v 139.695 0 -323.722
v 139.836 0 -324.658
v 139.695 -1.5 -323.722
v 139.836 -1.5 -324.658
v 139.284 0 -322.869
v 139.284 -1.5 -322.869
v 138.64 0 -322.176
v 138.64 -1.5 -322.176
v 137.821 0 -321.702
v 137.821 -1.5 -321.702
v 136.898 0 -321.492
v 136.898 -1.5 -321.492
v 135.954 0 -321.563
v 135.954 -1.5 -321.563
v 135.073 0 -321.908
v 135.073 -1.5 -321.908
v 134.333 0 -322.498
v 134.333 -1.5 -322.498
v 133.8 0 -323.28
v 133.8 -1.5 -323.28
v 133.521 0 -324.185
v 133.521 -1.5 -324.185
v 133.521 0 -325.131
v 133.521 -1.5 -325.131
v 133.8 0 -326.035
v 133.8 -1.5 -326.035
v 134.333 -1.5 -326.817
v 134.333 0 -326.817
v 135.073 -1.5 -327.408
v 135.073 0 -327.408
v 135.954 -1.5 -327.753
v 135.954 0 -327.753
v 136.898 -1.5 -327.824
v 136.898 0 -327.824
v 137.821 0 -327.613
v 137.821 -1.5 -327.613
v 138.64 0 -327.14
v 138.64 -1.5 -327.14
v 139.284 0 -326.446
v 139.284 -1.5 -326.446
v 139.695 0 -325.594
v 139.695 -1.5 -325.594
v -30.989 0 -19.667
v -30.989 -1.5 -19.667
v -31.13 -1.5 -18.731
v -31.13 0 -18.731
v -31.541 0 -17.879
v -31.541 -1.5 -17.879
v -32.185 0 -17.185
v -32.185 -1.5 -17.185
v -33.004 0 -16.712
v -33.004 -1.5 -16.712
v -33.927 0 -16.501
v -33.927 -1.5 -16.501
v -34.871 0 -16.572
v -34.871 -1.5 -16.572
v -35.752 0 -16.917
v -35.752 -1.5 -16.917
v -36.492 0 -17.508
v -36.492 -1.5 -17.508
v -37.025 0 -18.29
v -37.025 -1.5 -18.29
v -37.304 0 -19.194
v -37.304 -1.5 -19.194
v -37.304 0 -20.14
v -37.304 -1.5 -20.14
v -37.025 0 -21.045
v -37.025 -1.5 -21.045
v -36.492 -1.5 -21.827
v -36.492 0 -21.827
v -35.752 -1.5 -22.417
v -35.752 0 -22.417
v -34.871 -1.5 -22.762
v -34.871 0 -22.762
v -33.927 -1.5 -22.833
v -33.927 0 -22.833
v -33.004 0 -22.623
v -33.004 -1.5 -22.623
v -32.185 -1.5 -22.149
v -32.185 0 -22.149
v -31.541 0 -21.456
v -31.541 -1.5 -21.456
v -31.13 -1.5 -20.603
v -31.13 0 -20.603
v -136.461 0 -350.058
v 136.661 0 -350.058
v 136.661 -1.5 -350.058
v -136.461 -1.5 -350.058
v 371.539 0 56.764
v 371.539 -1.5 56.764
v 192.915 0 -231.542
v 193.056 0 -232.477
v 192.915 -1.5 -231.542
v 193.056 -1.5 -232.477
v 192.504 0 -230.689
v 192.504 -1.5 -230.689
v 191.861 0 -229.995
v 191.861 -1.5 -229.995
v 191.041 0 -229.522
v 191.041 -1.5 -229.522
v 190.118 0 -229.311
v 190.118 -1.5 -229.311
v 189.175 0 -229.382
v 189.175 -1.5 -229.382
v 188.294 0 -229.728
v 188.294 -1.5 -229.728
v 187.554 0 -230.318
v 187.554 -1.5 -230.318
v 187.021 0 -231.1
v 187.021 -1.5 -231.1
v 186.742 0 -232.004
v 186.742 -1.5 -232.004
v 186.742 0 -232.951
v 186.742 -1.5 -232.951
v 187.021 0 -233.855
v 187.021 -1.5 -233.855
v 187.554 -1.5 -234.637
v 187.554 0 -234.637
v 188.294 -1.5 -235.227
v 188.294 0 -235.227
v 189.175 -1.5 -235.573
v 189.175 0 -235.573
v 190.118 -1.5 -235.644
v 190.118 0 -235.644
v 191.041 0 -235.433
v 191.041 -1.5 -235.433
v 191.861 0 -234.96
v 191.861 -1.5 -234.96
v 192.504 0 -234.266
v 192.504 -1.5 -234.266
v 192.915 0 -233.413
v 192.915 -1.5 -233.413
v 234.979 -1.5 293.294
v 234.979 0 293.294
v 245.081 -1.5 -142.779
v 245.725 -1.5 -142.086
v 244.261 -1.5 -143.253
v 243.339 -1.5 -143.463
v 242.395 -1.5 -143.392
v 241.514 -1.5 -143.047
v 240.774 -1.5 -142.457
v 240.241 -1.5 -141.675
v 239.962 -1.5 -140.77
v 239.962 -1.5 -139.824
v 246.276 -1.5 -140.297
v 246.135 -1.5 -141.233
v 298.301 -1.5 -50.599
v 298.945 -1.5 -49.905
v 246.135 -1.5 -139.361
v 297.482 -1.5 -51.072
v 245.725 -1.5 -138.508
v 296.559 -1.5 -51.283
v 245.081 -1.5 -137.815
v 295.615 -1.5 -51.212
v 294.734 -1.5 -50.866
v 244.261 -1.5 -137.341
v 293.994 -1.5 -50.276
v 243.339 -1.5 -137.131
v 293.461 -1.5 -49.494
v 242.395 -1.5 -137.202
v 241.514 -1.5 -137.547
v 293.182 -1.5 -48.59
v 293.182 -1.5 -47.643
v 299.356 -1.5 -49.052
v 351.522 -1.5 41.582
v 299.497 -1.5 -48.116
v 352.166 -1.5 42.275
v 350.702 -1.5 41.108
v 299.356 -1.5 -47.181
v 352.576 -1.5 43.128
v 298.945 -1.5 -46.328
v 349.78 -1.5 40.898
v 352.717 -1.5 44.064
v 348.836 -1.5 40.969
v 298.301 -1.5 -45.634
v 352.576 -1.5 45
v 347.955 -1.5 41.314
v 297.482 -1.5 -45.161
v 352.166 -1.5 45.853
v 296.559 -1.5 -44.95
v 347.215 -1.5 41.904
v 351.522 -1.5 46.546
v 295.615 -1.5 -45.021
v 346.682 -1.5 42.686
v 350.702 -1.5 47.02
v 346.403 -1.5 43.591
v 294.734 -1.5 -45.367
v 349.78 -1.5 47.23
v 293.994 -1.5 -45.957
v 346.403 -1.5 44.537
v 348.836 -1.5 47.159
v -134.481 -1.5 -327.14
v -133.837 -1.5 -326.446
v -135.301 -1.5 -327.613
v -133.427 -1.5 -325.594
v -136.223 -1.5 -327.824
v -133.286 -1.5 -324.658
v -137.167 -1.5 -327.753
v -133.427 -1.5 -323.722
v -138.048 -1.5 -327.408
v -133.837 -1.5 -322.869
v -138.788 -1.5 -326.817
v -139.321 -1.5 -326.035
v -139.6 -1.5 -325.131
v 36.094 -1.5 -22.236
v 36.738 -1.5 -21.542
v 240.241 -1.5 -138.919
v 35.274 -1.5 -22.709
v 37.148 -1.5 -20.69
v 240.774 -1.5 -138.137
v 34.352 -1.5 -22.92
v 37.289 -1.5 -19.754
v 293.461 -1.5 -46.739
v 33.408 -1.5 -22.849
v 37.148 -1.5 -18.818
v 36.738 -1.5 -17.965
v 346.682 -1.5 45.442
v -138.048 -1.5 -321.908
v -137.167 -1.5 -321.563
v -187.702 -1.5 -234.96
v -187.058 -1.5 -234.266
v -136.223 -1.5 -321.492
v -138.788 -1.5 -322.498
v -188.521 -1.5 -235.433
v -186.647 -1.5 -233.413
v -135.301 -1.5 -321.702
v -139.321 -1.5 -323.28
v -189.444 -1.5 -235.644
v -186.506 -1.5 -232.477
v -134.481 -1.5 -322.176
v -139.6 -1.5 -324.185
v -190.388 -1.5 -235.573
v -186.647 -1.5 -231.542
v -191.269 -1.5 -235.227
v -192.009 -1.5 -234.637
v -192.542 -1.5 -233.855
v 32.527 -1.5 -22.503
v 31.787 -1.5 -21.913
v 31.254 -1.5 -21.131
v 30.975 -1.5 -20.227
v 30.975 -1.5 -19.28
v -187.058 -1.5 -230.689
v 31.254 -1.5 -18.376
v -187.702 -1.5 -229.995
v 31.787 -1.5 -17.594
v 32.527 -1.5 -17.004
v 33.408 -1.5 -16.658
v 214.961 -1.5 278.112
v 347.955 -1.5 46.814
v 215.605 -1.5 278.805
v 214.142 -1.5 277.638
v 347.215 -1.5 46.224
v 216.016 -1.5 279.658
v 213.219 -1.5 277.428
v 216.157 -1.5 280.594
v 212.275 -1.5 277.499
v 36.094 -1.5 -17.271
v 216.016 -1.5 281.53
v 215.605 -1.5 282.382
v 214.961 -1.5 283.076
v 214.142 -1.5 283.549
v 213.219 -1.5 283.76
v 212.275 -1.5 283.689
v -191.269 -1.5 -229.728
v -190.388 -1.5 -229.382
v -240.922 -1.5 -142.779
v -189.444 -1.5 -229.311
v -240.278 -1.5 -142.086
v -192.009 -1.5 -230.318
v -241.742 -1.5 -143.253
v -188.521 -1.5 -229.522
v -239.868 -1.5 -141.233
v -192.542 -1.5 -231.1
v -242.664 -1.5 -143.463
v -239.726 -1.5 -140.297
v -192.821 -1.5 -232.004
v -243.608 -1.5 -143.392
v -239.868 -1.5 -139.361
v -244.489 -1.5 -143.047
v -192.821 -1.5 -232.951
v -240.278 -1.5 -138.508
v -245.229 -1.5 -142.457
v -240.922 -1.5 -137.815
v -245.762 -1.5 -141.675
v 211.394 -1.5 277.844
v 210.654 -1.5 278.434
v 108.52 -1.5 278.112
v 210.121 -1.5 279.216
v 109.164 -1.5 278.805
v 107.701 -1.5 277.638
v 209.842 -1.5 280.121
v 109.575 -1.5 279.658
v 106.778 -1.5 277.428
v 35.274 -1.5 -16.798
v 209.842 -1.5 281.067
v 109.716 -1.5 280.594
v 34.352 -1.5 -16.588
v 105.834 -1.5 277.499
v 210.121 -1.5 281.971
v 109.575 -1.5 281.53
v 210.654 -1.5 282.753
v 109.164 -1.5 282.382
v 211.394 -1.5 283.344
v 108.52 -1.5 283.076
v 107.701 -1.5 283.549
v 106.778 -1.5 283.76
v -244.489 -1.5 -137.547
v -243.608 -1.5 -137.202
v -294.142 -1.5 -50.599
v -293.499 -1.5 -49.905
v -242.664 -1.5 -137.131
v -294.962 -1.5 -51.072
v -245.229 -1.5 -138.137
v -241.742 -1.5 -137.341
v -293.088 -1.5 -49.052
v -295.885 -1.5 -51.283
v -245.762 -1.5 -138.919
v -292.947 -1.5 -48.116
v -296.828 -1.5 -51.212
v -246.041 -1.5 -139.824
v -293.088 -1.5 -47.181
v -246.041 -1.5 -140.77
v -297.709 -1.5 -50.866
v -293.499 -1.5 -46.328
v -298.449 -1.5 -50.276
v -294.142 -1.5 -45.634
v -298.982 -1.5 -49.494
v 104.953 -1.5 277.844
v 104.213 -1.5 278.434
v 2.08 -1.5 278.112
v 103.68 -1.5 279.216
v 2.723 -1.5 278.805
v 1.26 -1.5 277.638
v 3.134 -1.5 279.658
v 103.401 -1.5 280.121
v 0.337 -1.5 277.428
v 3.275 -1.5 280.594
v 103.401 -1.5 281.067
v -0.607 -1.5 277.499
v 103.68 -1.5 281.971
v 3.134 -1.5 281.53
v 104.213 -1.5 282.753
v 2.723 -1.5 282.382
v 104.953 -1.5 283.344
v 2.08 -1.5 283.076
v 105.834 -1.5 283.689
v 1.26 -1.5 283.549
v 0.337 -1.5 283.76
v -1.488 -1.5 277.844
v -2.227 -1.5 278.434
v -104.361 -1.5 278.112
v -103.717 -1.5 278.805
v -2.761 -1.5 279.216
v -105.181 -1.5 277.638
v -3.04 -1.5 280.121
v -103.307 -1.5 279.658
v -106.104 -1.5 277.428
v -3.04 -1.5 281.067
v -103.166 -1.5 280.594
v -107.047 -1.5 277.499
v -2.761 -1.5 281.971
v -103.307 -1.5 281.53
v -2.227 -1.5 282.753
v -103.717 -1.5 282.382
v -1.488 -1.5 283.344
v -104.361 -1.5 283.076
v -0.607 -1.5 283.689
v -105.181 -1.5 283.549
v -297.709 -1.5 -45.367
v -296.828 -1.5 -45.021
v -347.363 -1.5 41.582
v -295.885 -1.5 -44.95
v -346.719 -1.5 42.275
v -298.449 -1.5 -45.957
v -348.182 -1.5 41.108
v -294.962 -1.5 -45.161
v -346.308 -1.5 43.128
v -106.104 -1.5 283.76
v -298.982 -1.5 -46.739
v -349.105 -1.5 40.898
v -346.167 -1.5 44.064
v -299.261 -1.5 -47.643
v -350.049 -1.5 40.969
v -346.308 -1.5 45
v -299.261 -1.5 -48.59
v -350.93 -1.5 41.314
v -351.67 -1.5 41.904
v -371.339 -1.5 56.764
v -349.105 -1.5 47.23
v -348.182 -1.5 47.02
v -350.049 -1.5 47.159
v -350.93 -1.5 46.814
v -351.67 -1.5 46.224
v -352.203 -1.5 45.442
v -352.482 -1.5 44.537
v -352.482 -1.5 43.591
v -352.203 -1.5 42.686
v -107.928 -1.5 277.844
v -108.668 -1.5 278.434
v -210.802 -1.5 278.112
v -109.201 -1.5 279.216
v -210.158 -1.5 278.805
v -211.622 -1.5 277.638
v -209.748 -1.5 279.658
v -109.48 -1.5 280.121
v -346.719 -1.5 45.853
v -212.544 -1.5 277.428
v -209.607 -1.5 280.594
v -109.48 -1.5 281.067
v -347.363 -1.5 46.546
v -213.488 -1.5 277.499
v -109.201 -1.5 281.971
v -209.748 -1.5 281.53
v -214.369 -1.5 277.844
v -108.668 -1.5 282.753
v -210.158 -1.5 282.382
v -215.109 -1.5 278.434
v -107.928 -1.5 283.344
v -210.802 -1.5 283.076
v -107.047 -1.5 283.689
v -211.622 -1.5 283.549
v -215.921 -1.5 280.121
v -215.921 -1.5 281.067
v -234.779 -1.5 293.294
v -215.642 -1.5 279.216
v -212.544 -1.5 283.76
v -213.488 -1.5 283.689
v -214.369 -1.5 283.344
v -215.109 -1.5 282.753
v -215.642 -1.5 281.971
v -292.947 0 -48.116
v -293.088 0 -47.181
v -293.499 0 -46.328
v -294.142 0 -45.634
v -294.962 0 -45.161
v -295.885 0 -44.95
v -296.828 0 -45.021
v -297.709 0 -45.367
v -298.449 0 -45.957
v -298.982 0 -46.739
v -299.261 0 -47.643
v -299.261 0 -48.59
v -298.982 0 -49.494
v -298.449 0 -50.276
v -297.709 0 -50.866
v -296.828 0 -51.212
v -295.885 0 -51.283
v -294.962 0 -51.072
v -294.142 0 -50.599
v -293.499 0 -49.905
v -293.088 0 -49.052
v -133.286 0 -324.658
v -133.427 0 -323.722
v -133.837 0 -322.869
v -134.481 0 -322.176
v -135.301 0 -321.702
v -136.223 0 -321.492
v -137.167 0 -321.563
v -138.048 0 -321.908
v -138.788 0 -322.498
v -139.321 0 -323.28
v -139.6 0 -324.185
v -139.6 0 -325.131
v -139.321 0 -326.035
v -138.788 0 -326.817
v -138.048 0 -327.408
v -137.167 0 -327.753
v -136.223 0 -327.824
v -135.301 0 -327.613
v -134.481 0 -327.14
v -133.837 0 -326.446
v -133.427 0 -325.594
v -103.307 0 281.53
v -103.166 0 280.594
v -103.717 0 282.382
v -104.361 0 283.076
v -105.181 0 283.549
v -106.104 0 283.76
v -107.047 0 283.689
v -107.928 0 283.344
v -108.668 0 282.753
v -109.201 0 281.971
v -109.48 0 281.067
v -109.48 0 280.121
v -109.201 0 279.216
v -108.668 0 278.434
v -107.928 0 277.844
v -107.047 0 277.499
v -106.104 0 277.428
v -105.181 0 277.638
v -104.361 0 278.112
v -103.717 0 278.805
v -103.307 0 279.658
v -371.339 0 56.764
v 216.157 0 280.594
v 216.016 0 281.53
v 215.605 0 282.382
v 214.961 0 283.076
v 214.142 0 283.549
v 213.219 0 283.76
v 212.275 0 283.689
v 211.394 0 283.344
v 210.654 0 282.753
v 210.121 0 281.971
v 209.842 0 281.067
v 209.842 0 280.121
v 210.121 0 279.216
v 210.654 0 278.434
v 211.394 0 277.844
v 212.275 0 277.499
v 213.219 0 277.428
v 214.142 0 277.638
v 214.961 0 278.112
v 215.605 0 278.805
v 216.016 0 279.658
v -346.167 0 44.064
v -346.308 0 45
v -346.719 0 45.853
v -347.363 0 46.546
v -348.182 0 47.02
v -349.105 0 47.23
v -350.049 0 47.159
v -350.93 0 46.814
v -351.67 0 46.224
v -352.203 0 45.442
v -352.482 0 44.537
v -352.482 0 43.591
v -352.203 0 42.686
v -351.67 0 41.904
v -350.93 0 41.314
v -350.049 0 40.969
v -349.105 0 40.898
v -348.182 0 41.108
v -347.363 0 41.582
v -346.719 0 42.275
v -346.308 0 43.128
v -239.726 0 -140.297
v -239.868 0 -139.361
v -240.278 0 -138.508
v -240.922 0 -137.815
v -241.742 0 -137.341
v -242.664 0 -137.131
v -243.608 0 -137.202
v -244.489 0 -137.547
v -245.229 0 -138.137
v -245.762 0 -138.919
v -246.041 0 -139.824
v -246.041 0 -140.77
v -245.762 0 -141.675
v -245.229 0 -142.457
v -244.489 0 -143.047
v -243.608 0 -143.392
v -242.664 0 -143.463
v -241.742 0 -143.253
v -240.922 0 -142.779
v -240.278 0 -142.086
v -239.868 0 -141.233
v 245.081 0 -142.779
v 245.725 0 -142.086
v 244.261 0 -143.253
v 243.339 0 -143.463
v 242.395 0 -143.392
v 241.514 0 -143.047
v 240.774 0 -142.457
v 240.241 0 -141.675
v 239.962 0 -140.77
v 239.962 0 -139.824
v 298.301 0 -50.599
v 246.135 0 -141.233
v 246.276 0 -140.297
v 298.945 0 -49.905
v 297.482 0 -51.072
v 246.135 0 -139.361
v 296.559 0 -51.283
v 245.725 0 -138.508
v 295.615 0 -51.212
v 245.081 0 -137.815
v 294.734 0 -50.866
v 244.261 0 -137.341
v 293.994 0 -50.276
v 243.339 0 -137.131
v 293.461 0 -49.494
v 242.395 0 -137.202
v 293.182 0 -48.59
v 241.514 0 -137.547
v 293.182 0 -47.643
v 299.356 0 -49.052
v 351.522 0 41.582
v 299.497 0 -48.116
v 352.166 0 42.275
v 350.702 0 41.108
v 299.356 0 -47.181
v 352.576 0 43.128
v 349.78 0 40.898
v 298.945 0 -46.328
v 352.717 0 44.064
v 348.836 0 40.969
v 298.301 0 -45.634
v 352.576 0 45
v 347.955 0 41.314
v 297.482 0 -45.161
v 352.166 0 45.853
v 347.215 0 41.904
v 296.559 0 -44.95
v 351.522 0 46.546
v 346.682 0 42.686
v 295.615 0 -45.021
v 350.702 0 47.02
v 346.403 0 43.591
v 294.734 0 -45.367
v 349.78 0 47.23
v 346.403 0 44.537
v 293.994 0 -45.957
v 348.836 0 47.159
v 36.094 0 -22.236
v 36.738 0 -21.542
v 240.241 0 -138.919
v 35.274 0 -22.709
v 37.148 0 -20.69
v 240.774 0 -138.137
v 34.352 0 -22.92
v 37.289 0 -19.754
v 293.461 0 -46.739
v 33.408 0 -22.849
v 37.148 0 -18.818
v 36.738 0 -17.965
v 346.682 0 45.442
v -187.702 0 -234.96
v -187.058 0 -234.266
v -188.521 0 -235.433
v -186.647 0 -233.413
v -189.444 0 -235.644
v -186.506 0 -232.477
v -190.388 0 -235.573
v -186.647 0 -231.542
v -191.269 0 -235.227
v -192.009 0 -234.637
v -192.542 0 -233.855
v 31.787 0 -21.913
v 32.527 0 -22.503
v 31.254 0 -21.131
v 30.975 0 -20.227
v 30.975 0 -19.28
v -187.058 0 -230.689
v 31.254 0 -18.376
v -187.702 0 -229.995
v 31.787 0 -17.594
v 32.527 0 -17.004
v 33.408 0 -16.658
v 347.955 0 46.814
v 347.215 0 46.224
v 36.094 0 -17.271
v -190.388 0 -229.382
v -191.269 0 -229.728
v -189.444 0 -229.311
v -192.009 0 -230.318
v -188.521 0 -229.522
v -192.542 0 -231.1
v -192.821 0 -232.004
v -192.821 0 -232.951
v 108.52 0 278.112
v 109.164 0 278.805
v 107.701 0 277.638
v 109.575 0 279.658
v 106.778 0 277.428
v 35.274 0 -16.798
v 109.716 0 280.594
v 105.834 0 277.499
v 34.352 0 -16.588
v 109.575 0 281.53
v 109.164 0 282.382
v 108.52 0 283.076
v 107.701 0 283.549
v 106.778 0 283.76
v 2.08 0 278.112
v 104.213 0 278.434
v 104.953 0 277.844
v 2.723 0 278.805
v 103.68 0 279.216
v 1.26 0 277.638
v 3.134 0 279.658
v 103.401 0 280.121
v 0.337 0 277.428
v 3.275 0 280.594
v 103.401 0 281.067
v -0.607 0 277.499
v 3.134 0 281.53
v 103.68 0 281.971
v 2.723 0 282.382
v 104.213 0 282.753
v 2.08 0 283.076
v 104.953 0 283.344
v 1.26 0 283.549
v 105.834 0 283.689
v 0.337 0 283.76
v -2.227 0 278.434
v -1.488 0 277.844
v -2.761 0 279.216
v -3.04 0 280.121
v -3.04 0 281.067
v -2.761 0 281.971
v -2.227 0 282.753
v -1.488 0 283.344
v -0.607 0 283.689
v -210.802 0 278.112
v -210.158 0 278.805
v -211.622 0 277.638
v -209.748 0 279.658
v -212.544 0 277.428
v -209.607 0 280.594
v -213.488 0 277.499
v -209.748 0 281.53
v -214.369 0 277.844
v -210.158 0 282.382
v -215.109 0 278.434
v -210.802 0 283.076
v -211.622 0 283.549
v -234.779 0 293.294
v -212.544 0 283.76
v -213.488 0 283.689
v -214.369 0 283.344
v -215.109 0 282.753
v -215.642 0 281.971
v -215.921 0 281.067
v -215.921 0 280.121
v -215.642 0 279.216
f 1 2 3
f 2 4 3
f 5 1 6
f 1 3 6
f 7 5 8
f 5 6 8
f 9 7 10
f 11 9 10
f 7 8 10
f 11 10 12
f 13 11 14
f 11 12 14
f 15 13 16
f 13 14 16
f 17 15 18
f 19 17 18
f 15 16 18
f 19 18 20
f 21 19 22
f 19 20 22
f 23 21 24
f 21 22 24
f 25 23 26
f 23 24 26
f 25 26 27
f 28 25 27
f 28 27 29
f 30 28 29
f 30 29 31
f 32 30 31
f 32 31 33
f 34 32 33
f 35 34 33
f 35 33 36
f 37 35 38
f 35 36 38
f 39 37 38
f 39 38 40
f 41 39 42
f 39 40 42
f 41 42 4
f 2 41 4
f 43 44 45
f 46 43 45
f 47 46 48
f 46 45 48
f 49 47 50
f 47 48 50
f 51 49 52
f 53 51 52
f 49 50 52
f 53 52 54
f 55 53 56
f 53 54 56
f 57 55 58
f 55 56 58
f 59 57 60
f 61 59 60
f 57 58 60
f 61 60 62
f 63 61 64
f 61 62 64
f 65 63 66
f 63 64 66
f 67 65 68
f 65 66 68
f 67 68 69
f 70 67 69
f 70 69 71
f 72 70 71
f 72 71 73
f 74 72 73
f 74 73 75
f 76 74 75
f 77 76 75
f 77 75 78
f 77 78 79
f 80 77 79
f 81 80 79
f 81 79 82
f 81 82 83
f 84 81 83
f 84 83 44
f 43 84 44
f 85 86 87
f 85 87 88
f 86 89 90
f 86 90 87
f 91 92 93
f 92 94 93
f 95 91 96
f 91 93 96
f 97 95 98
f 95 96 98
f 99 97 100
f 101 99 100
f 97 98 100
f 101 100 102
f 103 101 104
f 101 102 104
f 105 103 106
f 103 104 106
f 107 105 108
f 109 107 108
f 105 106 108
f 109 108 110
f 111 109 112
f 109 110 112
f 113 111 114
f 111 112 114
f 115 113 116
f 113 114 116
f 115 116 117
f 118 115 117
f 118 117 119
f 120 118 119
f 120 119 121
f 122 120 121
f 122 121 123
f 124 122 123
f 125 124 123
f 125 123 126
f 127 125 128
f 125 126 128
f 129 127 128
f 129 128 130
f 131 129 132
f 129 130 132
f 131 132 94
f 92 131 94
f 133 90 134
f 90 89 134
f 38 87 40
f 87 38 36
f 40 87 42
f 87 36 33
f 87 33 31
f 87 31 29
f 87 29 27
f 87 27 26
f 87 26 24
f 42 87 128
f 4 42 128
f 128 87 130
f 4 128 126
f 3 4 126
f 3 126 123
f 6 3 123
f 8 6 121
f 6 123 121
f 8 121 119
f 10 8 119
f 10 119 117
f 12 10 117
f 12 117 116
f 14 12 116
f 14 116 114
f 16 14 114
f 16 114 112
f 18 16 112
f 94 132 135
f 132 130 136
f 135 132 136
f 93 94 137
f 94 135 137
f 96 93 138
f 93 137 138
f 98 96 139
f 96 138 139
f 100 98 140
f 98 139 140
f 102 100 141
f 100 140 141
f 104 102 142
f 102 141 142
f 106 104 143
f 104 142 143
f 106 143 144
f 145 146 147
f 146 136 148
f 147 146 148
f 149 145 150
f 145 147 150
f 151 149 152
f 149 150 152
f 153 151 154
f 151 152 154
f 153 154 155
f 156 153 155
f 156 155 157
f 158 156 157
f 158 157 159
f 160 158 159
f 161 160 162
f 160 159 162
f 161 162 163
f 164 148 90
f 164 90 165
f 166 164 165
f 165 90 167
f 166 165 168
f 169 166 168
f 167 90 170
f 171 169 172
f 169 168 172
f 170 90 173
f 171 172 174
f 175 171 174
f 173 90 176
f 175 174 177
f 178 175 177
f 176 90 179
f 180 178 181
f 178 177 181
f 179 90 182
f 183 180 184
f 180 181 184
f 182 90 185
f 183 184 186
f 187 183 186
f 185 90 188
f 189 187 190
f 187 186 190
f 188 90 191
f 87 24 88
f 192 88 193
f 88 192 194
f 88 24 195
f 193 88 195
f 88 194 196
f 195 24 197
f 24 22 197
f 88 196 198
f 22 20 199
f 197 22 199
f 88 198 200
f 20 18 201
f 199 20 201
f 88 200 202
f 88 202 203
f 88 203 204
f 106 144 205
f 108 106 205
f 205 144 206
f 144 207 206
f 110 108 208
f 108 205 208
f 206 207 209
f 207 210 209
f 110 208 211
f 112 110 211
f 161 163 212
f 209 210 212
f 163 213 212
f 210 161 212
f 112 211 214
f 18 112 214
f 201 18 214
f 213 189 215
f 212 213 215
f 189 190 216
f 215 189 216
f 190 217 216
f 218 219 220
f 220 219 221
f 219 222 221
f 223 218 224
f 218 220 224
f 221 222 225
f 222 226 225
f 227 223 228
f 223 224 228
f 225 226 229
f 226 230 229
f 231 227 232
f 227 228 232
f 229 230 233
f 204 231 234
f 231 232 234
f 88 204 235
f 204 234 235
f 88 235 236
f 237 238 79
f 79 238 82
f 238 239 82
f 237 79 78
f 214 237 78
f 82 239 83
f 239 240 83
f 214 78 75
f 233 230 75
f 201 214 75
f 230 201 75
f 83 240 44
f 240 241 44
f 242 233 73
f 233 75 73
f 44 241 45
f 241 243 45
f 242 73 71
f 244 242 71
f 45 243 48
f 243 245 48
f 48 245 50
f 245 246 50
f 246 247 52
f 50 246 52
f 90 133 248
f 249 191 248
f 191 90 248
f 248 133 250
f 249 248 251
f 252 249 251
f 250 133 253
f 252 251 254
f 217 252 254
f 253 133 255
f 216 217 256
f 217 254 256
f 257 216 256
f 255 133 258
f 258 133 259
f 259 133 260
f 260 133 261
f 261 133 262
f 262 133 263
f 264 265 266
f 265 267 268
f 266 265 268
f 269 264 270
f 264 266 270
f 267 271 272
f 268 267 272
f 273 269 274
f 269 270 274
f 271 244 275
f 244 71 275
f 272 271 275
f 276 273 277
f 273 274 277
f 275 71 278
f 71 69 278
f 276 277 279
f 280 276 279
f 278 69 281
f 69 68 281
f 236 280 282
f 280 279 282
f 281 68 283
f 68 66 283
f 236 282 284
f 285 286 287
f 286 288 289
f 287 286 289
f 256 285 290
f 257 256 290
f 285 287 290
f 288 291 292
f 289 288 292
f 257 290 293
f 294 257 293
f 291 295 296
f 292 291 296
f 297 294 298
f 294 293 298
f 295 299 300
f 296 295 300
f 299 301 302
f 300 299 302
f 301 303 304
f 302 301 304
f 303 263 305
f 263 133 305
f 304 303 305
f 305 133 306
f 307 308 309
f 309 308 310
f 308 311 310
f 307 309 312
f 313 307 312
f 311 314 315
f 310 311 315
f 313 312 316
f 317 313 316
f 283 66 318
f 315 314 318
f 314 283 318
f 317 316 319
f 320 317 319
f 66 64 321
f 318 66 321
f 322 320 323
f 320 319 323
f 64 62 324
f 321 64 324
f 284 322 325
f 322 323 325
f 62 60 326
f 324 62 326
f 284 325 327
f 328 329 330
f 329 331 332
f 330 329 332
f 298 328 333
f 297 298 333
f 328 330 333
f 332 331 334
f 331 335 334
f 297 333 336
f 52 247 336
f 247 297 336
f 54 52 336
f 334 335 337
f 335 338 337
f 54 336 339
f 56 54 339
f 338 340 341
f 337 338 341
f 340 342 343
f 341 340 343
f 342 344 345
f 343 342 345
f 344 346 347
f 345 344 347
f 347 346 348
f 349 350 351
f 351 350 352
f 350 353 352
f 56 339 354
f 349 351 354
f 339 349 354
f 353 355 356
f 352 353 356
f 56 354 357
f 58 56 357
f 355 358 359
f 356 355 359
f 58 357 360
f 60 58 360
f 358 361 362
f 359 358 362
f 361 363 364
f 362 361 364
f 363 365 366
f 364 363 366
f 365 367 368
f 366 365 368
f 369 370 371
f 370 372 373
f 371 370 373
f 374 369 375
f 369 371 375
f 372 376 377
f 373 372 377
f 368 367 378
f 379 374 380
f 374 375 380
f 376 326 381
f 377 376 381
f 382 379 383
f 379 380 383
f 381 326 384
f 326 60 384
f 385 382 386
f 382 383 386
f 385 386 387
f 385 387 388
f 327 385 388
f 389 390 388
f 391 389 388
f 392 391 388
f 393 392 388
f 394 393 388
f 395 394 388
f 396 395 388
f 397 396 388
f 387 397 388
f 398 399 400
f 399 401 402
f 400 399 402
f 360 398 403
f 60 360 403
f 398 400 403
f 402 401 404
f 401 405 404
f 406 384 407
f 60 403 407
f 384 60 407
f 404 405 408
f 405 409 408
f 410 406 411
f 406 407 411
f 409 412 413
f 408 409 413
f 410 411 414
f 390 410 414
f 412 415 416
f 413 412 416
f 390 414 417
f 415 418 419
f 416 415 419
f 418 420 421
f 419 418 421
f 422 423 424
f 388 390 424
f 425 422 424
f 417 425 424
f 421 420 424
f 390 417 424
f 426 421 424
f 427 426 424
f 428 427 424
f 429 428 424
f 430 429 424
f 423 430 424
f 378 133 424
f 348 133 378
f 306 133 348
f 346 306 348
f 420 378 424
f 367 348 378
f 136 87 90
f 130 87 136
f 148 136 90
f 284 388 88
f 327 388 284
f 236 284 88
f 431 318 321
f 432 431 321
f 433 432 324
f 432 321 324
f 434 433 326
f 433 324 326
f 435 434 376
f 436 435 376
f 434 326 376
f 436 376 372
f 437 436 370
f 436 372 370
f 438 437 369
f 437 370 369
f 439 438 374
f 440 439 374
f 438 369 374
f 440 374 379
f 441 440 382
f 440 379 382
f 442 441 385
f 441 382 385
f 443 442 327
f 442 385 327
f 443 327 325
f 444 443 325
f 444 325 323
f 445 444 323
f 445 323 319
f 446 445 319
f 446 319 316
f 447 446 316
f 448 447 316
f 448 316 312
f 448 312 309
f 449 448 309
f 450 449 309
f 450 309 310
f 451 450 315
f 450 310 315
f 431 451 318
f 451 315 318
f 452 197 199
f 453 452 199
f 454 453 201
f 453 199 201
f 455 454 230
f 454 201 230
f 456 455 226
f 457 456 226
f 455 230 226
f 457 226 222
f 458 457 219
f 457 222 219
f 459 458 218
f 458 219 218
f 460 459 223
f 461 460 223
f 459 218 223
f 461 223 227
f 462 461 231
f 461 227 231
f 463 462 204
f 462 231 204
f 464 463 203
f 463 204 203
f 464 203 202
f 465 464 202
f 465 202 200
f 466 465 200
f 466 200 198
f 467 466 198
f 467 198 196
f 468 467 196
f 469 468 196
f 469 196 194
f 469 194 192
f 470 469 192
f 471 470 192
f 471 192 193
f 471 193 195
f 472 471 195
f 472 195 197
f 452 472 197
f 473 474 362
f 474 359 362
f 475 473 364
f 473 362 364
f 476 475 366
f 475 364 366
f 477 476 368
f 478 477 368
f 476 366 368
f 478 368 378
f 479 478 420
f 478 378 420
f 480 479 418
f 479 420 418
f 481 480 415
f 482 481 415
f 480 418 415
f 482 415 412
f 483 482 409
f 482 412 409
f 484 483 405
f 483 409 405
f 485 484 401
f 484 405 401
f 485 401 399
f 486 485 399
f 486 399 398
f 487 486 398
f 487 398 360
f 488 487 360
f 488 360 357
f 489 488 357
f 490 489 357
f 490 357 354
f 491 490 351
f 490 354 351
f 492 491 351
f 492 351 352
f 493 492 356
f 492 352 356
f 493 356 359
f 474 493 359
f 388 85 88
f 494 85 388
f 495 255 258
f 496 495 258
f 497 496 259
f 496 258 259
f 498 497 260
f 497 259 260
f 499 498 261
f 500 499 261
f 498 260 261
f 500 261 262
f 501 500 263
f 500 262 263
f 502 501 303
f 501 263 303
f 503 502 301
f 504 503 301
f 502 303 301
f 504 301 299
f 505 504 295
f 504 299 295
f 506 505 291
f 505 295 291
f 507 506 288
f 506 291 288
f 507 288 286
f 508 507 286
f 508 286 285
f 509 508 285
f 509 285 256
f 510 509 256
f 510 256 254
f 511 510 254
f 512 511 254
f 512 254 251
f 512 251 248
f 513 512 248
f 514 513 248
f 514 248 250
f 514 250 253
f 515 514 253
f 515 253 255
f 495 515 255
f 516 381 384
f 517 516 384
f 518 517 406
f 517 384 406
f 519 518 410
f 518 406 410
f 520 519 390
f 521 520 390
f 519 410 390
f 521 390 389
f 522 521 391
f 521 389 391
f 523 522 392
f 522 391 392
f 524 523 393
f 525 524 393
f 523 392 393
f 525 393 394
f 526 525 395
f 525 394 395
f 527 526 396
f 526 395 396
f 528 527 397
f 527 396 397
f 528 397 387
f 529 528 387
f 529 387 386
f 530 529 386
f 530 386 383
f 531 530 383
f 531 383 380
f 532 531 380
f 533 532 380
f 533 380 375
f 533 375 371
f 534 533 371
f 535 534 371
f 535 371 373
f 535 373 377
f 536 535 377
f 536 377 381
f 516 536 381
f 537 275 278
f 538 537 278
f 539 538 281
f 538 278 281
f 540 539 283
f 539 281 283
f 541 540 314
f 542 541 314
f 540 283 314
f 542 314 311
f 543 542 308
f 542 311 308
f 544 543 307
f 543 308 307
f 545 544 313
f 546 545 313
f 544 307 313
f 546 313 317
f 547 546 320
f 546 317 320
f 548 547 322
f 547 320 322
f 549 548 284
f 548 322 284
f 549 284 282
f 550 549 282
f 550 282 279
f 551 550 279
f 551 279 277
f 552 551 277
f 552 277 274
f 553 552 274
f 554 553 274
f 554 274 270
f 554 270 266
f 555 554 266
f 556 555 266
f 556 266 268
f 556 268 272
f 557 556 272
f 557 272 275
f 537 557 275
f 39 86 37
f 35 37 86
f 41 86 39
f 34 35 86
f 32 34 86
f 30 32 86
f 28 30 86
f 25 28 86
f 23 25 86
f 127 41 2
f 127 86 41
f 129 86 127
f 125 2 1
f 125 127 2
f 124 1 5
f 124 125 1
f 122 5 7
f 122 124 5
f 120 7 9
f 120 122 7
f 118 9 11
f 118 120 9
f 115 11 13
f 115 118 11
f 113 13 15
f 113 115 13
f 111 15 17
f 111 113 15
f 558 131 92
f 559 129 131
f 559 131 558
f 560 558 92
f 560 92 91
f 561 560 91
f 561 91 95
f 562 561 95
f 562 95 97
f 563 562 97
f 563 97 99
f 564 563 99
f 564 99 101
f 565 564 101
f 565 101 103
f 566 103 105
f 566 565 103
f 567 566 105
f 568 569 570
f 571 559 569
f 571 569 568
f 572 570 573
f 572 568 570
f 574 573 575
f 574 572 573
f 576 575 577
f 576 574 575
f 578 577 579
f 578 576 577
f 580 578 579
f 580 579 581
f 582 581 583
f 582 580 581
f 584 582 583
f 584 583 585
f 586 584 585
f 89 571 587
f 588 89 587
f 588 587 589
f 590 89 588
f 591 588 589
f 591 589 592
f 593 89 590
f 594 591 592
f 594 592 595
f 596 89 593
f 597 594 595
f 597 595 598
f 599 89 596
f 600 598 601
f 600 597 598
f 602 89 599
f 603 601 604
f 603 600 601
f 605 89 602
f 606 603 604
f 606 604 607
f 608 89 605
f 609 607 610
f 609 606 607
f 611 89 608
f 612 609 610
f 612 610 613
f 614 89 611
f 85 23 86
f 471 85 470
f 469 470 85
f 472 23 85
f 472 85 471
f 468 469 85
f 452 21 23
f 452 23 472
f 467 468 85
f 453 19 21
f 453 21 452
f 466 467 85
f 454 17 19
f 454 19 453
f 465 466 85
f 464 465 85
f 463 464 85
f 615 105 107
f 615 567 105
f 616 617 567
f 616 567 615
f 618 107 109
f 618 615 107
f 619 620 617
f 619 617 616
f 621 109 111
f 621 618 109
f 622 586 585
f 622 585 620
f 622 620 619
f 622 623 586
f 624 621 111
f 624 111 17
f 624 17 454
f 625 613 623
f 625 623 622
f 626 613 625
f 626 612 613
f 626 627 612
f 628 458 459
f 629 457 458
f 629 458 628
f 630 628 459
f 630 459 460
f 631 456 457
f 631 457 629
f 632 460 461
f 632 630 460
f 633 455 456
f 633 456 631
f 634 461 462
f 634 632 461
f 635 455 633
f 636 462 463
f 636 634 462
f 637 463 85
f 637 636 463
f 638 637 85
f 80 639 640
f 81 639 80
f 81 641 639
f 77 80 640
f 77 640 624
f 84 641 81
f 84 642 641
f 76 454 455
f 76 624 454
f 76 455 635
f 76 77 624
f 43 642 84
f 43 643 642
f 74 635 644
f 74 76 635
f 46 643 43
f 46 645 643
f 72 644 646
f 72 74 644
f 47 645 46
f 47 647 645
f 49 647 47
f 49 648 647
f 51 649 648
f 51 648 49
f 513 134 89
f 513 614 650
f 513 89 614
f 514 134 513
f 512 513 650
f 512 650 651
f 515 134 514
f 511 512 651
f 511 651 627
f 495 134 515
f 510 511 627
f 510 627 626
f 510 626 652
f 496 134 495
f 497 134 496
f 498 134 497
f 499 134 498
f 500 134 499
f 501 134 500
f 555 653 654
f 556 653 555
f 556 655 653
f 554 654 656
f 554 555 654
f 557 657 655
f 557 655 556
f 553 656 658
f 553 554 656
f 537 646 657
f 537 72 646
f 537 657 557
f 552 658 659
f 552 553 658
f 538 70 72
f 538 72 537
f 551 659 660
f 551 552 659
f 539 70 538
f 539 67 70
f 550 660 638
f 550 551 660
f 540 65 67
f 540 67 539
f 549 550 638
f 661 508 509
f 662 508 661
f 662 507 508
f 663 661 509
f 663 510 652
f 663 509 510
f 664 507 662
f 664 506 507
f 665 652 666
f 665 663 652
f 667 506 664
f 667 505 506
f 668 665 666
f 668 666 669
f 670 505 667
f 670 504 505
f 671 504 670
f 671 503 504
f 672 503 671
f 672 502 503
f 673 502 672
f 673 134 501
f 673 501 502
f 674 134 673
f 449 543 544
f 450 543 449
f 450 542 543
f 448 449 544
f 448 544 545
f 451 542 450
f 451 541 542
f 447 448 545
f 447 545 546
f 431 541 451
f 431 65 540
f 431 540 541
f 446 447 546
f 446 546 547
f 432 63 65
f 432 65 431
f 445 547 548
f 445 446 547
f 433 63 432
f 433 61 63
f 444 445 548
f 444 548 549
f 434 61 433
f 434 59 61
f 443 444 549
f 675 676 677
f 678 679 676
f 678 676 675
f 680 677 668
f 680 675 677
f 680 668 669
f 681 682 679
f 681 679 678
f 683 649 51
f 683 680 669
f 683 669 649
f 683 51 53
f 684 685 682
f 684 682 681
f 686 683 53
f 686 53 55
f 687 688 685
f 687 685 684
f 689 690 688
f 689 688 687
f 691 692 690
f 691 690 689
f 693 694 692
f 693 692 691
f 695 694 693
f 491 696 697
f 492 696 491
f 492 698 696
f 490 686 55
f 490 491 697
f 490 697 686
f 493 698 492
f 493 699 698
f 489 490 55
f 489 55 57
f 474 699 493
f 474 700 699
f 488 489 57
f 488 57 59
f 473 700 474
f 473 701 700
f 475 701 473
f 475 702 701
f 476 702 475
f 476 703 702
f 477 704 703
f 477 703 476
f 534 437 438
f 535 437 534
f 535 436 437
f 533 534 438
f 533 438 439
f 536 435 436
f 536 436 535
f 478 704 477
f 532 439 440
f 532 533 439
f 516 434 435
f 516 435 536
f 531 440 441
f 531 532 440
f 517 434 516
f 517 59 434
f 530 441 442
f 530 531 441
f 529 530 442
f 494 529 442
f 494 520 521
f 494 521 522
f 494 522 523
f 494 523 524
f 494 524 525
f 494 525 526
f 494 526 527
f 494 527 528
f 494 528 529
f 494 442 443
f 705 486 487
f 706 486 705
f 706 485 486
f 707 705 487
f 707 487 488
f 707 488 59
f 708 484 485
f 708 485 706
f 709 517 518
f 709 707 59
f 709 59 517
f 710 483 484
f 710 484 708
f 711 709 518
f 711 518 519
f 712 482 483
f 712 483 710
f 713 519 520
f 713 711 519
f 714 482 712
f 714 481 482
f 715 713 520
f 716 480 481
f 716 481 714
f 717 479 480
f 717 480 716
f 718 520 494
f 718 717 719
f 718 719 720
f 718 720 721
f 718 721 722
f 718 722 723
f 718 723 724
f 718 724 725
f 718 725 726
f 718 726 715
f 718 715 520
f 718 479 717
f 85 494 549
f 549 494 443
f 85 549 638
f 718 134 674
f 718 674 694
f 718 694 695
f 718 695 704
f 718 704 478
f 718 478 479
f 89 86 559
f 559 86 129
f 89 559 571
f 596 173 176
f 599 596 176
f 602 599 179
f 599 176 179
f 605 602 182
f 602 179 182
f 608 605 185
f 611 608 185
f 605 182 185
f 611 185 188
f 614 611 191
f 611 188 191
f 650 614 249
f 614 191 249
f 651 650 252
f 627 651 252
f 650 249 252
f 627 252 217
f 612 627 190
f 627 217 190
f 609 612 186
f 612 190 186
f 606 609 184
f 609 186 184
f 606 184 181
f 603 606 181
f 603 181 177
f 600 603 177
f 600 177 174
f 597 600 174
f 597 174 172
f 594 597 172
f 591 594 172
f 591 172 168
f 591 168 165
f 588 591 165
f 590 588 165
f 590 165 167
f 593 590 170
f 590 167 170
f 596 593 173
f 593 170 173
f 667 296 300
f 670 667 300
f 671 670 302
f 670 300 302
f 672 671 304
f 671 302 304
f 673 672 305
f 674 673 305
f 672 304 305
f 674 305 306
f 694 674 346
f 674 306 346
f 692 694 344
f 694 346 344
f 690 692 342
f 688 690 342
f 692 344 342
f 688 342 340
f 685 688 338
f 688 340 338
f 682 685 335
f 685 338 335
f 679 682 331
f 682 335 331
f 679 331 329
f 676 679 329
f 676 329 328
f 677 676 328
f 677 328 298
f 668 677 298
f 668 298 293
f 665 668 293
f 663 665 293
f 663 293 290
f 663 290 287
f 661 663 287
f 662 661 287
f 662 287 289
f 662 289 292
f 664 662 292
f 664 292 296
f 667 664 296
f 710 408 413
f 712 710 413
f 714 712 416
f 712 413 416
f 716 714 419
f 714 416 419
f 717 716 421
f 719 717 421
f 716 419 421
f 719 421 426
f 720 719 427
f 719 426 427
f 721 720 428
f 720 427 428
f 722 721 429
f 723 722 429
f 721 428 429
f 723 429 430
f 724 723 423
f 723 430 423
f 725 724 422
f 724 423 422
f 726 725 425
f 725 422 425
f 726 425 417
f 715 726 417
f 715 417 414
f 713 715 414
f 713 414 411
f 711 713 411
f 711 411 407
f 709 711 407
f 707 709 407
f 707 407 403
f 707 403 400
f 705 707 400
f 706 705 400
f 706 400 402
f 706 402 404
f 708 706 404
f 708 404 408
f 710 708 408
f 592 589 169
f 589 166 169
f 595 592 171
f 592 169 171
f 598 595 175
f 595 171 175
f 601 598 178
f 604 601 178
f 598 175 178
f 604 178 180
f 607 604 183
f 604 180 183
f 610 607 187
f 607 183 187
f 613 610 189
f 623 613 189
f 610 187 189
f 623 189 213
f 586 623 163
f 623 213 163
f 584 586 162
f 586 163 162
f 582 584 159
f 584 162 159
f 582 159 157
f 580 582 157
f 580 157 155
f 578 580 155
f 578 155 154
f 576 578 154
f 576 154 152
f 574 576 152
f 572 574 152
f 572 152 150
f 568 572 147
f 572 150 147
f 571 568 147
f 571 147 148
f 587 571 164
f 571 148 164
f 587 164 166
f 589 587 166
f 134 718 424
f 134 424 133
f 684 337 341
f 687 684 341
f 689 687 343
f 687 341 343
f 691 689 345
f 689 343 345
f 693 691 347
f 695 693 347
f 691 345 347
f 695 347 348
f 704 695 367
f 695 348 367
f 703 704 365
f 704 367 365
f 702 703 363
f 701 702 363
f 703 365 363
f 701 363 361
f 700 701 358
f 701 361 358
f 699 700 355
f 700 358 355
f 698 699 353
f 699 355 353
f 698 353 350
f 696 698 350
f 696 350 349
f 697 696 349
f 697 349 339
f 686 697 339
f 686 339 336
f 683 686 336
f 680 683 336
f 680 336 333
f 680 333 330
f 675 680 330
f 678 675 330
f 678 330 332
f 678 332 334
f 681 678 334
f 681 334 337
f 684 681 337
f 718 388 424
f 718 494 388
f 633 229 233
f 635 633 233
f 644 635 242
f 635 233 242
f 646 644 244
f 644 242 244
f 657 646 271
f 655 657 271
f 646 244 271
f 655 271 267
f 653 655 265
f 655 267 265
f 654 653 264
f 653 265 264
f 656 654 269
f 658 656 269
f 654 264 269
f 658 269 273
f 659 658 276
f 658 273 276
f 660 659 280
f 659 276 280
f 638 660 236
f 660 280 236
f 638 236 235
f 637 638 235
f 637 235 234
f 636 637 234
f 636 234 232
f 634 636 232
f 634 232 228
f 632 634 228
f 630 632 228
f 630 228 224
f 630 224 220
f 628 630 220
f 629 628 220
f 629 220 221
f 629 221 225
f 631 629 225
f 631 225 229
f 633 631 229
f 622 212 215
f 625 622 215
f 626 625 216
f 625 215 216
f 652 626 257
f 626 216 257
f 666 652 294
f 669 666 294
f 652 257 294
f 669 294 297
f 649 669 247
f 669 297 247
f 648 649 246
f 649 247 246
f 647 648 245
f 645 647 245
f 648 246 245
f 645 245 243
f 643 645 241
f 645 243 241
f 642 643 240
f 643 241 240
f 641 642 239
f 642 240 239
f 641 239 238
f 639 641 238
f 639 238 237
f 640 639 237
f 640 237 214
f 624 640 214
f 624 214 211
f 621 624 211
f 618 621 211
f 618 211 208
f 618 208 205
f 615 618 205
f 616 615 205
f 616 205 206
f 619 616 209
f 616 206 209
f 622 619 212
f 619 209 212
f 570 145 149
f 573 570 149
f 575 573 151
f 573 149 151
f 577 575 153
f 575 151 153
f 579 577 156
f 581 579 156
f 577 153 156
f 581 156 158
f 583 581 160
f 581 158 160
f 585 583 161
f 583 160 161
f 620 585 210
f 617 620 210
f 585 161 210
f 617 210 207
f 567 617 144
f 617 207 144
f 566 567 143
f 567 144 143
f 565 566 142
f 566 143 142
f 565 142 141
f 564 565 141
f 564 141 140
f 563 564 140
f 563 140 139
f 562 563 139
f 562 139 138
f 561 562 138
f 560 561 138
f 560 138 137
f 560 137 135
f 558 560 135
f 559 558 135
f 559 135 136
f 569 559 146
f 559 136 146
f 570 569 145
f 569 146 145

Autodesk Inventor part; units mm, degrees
ref_plane "YZ Plane" through (0, 0, 0) normal (1, 0, 0) x (0, 1, 0)
ref_plane "XZ Plane" through (0, 0, 0) normal (0, 1, 0) x (-1, 0, 0)
ref_plane "XY Plane" through (0, 0, 0) normal (0, 0, 1) x (1, 0, 0)
sketch "Sketch1" plane through (0, 0, 0) normal (0, 1, 0) x (-1, 0, 0)
  line L0 (101.5, -410.6115) -> (-101.7, -410.6115)
  line L1 (101.5, -410.6115) -> (406.3, 117.3176)
  line L2 (406.3, 117.3176) -> (304.7, 293.2939)
  line L3 (304.7, 293.2939) -> (-304.9, 293.2939)
  line L4 (-304.9, 293.2939) -> (-406.5, 117.3176)
  line L5 (-304.9, 293.2939) -> (-101.7, 293.2939) construction
  line L6 (-406.5, 117.3176) -> (-101.7, -410.6115)
  line L7 (-0.1, -410.6115) -> (-0.1, 293.2939) construction
  line L8 (-355.7, 205.3058) -> (253.9, -146.647) construction
  line L9 (-254.1, -146.647) -> (355.5, 205.3058) construction
  line L10 (34.1394, 19.7104) -> (0, 0) construction
  line L11 (0, 0) -> (-34.1644, -19.6671) construction
  line L12 (0, 0) -> (34.1144, -19.7537) construction
  circle A0 centre (-34.1644, -19.6671) radius 3.175 construction
  circle A1 centre (34.1144, -19.7537) radius 3.175 construction
  dimension "d0" = 120
  dimension "d1" = 203.2
  dimension "d3" = 609.6
  dimension "d8" = 203.2
  dimension "d10" = 120
  dimension "d13" = 609.6
  dimension "d15" = 203.2
  dimension "d16" = 120
  dimension "d17" = 609.6
  dimension "d18" = 120
  dimension "d22" = 101.6
  dimension "d122" = 39.4208
  dimension "d123" = 39.4208
  dimension "d124" = 6.35
  dimension "d125" = 6.35
extrude "Extrusion1" add sketch "Sketch1" against normal blind 1.5
sketch "Sketch2" plane through (0, 0, 0) normal (0, 1, 0) x (1, 0, 0)
  line L0 (-101.5, 410.6115) -> (101.7, 410.6115) projected
  line L1 (-406.3, -117.3176) -> (-101.5, 410.6115) projected
  line L2 (-304.7, -293.2939) -> (-406.3, -117.3176) projected
  line L3 (304.9, -293.2939) -> (-304.7, -293.2939) projected
  line L4 (406.5, -117.3176) -> (304.9, -293.2939) projected
  line L5 (101.7, 410.6115) -> (406.5, -117.3176) projected
  line L6 (0.1, 410.6115) -> (0.1, 350.0579) construction
  line L7 (0.1, 350.0579) -> (136.6606, 350.0579) construction
  line L8 (0.1, 350.0579) -> (-136.4606, 350.0579) construction
  line L9 (-355.5, -205.3058) -> (-303.059, -175.029) construction
  line L10 (355.7, -205.3058) -> (303.259, -175.029) construction
  line L11 (303.259, -175.029) -> (371.5394, -56.764) construction
  line L12 (303.259, -175.029) -> (234.9787, -293.2939) construction
  line L13 (-303.059, -175.029) -> (-234.7787, -293.2939) construction
  line L14 (-303.059, -175.029) -> (-371.3394, -56.764) construction
  line L15 (-371.3394, -56.764) -> (-234.7787, -293.2939)
  line L16 (-304.7, -293.2939) -> (-234.7787, -293.2939)
  line L17 (-304.7, -293.2939) -> (-406.3, -117.3176)
  line L18 (-371.3394, -56.764) -> (-406.3, -117.3176)
  line L19 (-101.5, 410.6115) -> (-136.4606, 350.0579)
  line L20 (-101.5, 410.6115) -> (101.7, 410.6115)
  line L21 (136.6606, 350.0579) -> (101.7, 410.6115)
  line L22 (136.6606, 350.0579) -> (-136.4606, 350.0579)
  line L23 (371.5394, -56.764) -> (234.9787, -293.2939)
  line L24 (304.9, -293.2939) -> (234.9787, -293.2939)
  line L25 (304.9, -293.2939) -> (406.5, -117.3176)
  line L26 (406.5, -117.3176) -> (371.5394, -56.764)
  point P0 (0, 0)
  dimension "d25" = 60.5536
  dimension "d26" = 60.5536
  dimension "d27" = 118.265
  dimension "d28" = 118.265
  dimension "d29" = 118.265
  dimension "d30" = 118.265
  dimension "d31" = 136.5606
  dimension "d32" = 136.5606
extrude "Extrusion2" cut sketch "Sketch2" against normal blind 25.4 contours L0 L5 L22 L1 | L15 L3 L2 L1 | L5 L4 L3 L23
sketch "Sketch5" plane through (0, -1.5, 0) normal (0, -1, 0) x (1, 0, 0)
  line L0 (-234.7787, 293.2939) -> (-371.3394, 56.764) projected
  line L1 (-136.4606, -350.0579) -> (136.6606, -350.0579) projected
  line L2 (136.6606, -350.0579) -> (371.5394, 56.764) projected
  line L3 (371.5394, 56.764) -> (234.9787, 293.2939) projected
  line L4 (-303.059, 175.029) -> (-281.062, 162.329) construction
  line L5 (303.259, 175.029) -> (281.262, 162.329) construction
  line L6 (0.1, -350.0579) -> (0.1, -324.6579) construction
  line L7 (-371.3394, 56.764) -> (-349.3423, 44.064) construction
  line L8 (234.9787, 293.2939) -> (212.9817, 280.5939) construction
  line L9 (371.5394, 56.764) -> (349.5423, 44.064) construction
  line L10 (-136.4606, -350.0579) -> (-136.4606, -324.6579) construction
  line L11 (136.6606, -350.0579) -> (136.6606, -324.6579) construction
  line L12 (-136.4606, -324.6579) -> (-136.4606, -324.6579) construction
  line L13 (136.6606, -324.6579) -> (136.6606, -324.6579) construction
  line L14 (-349.3423, 44.064) -> (-349.3423, 44.064) construction
  line L15 (-234.7787, 293.2939) -> (-212.7817, 280.5939) construction
  line L16 (-212.7817, 280.5939) -> (-212.7817, 280.5939) construction
  circle A0 centre (-349.3423, 44.064) radius 3.175
  circle A1 centre (-212.7817, 280.5939) radius 3.175
  circle A2 centre (212.9817, 280.5939) radius 3.175
  circle A3 centre (349.5423, 44.064) radius 3.175
  circle A4 centre (136.6606, -324.6579) radius 3.175
  circle A5 centre (-136.4606, -324.6579) radius 3.175
  line L17 (212.9817, 280.5939) -> (212.9817, 280.5939)
  line L18 (349.5423, 44.064) -> (349.5423, 44.064)
  line L19 (-212.7817, 280.5939) -> (-106.3408, 280.5939) construction
  line L20 (-106.3408, 280.5939) -> (0.1, 280.5939) construction
  line L21 (0.1, 280.5939) -> (106.5408, 280.5939) construction
  line L22 (106.5408, 280.5939) -> (212.9817, 280.5939) construction
  circle A6 centre (-106.3408, 280.5939) radius 3.175
  circle A7 centre (0.1, 280.5939) radius 3.175
  circle A8 centre (106.5408, 280.5939) radius 3.175
  line L23 (-349.3423, 44.064) -> (-296.1219, -48.1165) construction
  line L24 (-296.1219, -48.1165) -> (-242.9015, -140.297) construction
  line L25 (-242.9015, -140.297) -> (-189.6811, -232.4774) construction
  line L26 (-189.6811, -232.4774) -> (-136.4606, -324.6579) construction
  circle A9 centre (-296.1219, -48.1165) radius 3.175
  circle A10 centre (-242.9015, -140.297) radius 3.175
  circle A11 centre (-189.6811, -232.4774) radius 3.175
  line L27 (136.6606, -324.6579) -> (189.8811, -232.4774) construction
  line L28 (189.8811, -232.4774) -> (243.1015, -140.297) construction
  line L29 (243.1015, -140.297) -> (296.3219, -48.1165) construction
  line L30 (296.3219, -48.1165) -> (349.5423, 44.064) construction
  circle A12 centre (189.8811, -232.4774) radius 3.175
  circle A13 centre (243.1015, -140.297) radius 3.175
  circle A14 centre (296.3219, -48.1165) radius 3.175
  point P0 (0, 0)
  dimension "d67" = 25.4
  dimension "d68" = 25.4
  dimension "d69" = 25.4
  dimension "d70" = 25.4
  dimension "d71" = 25.4
  dimension "d72" = 25.4
  dimension "d73" = 0
  dimension "d74" = 0
  dimension "d75" = 0
  dimension "d76" = 0
  dimension "d77" = 6.35
  dimension "d78" = 6.35
  dimension "d79" = 6.35
  dimension "d80" = 6.35
  dimension "d81" = 6.35
  dimension "d82" = 6.35
  dimension "d83" = 0
  dimension "d84" = 0
  dimension "d87" = 425.7634
  dimension "d88" = 106.4408
  dimension "d89" = 106.4408
  dimension "d90" = 106.4408
  dimension "d91" = 106.4408
  dimension "d92" = 6.35
  dimension "d93" = 6.35
  dimension "d94" = 6.35
  dimension "d95" = 106.4408
  dimension "d96" = 106.4408
  dimension "d97" = 106.4408
  dimension "d98" = 106.4408
  dimension "d99" = 6.35
  dimension "d100" = 6.35
  dimension "d101" = 6.35
  dimension "d102" = 106.4408
  dimension "d103" = 106.4408
  dimension "d104" = 106.4408
  dimension "d105" = 106.4408
  dimension "d106" = 6.35
  dimension "d107" = 6.35
  dimension "d108" = 6.35
extrude "Extrusion5" cut sketch "Sketch5" against normal blind 25.4 contours A0 | A1 | A2 | A3 | A4 | A5
sketch "Sketch6" plane through (0, -1.5, 0) normal (0, -1, 0) x (1, 0, 0)
  circle A0 centre (-106.3408, 280.5939) radius 3.175
  circle A1 centre (0.1, 280.5939) radius 3.175
  circle A2 centre (106.5408, 280.5939) radius 3.175
  circle A3 centre (-296.1219, -48.1165) radius 3.175
  circle A4 centre (-242.9015, -140.297) radius 3.175
  circle A5 centre (-189.6811, -232.4774) radius 3.175
  circle A6 centre (189.8811, -232.4774) radius 3.175
  circle A7 centre (243.1015, -140.297) radius 3.175
  circle A8 centre (296.3219, -48.1165) radius 3.175
  point P0 (0, 0)
  dimension "d109" = 6.35
  dimension "d110" = 6.35
  dimension "d111" = 6.35
  dimension "d112" = 6.35
  dimension "d113" = 6.35
  dimension "d114" = 6.35
  dimension "d115" = 6.35
  dimension "d116" = 6.35
  dimension "d117" = 6.35
extrude "Extrusion6" cut sketch "Sketch6" against normal blind 25.4
sketch "Sketch7" plane through (0, -1.5, 0) normal (0, -1, 0) x (1, 0, 0)
  circle A0 centre (-34.1644, -19.6671) radius 3.175
  circle A1 centre (34.1144, -19.7537) radius 3.175
  point P0 (0, 0)
  dimension "d126" = 6.35
  dimension "d127" = 6.35
extrude "Extrusion7" cut sketch "Sketch7" against normal blind 25.4
equation "\"d8\" = d1"
equation "\"d13\" = d3"
equation "\"d15\" = d1"
equation "\"d124\" = d125"
equation "\"d88\" = 0.25 * d87"
equation "\"d90\" = d88"
equation "\"d91\" = d88"
equation "\"d92\" = d78"
equation "\"d93\" = d78"
equation "\"d94\" = d78"
equation "\"d95\" = d88"
equation "\"d96\" = d95"
equation "\"d97\" = d96"
equation "\"d98\" = d97"
equation "\"d99\" = d100"
equation "\"d100\" = d77"
equation "\"d101\" = d99"
equation "\"d102\" = d103"
equation "\"d103\" = d104"
equation "\"d104\" = d98"
equation "\"d105\" = d104"
equation "\"d106\" = d107"
equation "\"d107\" = d108"
equation "\"d108\" = d94"
equation "\"d109\" = d118"
equation "\"d110\" = d118"
equation "\"d111\" = d118"
equation "\"d112\" = d113"
equation "\"d113\" = d119"
equation "\"d114\" = d112"
equation "\"d115\" = d116"
equation "\"d116\" = d117"
equation "\"d117\" = d111"
equation "\"d126\" = d127"
equation "\"d118\" = 6.35"
equation "\"d119\" = 6.35"
properties part number "Base Plate" material "Prefabulated Amulite"
